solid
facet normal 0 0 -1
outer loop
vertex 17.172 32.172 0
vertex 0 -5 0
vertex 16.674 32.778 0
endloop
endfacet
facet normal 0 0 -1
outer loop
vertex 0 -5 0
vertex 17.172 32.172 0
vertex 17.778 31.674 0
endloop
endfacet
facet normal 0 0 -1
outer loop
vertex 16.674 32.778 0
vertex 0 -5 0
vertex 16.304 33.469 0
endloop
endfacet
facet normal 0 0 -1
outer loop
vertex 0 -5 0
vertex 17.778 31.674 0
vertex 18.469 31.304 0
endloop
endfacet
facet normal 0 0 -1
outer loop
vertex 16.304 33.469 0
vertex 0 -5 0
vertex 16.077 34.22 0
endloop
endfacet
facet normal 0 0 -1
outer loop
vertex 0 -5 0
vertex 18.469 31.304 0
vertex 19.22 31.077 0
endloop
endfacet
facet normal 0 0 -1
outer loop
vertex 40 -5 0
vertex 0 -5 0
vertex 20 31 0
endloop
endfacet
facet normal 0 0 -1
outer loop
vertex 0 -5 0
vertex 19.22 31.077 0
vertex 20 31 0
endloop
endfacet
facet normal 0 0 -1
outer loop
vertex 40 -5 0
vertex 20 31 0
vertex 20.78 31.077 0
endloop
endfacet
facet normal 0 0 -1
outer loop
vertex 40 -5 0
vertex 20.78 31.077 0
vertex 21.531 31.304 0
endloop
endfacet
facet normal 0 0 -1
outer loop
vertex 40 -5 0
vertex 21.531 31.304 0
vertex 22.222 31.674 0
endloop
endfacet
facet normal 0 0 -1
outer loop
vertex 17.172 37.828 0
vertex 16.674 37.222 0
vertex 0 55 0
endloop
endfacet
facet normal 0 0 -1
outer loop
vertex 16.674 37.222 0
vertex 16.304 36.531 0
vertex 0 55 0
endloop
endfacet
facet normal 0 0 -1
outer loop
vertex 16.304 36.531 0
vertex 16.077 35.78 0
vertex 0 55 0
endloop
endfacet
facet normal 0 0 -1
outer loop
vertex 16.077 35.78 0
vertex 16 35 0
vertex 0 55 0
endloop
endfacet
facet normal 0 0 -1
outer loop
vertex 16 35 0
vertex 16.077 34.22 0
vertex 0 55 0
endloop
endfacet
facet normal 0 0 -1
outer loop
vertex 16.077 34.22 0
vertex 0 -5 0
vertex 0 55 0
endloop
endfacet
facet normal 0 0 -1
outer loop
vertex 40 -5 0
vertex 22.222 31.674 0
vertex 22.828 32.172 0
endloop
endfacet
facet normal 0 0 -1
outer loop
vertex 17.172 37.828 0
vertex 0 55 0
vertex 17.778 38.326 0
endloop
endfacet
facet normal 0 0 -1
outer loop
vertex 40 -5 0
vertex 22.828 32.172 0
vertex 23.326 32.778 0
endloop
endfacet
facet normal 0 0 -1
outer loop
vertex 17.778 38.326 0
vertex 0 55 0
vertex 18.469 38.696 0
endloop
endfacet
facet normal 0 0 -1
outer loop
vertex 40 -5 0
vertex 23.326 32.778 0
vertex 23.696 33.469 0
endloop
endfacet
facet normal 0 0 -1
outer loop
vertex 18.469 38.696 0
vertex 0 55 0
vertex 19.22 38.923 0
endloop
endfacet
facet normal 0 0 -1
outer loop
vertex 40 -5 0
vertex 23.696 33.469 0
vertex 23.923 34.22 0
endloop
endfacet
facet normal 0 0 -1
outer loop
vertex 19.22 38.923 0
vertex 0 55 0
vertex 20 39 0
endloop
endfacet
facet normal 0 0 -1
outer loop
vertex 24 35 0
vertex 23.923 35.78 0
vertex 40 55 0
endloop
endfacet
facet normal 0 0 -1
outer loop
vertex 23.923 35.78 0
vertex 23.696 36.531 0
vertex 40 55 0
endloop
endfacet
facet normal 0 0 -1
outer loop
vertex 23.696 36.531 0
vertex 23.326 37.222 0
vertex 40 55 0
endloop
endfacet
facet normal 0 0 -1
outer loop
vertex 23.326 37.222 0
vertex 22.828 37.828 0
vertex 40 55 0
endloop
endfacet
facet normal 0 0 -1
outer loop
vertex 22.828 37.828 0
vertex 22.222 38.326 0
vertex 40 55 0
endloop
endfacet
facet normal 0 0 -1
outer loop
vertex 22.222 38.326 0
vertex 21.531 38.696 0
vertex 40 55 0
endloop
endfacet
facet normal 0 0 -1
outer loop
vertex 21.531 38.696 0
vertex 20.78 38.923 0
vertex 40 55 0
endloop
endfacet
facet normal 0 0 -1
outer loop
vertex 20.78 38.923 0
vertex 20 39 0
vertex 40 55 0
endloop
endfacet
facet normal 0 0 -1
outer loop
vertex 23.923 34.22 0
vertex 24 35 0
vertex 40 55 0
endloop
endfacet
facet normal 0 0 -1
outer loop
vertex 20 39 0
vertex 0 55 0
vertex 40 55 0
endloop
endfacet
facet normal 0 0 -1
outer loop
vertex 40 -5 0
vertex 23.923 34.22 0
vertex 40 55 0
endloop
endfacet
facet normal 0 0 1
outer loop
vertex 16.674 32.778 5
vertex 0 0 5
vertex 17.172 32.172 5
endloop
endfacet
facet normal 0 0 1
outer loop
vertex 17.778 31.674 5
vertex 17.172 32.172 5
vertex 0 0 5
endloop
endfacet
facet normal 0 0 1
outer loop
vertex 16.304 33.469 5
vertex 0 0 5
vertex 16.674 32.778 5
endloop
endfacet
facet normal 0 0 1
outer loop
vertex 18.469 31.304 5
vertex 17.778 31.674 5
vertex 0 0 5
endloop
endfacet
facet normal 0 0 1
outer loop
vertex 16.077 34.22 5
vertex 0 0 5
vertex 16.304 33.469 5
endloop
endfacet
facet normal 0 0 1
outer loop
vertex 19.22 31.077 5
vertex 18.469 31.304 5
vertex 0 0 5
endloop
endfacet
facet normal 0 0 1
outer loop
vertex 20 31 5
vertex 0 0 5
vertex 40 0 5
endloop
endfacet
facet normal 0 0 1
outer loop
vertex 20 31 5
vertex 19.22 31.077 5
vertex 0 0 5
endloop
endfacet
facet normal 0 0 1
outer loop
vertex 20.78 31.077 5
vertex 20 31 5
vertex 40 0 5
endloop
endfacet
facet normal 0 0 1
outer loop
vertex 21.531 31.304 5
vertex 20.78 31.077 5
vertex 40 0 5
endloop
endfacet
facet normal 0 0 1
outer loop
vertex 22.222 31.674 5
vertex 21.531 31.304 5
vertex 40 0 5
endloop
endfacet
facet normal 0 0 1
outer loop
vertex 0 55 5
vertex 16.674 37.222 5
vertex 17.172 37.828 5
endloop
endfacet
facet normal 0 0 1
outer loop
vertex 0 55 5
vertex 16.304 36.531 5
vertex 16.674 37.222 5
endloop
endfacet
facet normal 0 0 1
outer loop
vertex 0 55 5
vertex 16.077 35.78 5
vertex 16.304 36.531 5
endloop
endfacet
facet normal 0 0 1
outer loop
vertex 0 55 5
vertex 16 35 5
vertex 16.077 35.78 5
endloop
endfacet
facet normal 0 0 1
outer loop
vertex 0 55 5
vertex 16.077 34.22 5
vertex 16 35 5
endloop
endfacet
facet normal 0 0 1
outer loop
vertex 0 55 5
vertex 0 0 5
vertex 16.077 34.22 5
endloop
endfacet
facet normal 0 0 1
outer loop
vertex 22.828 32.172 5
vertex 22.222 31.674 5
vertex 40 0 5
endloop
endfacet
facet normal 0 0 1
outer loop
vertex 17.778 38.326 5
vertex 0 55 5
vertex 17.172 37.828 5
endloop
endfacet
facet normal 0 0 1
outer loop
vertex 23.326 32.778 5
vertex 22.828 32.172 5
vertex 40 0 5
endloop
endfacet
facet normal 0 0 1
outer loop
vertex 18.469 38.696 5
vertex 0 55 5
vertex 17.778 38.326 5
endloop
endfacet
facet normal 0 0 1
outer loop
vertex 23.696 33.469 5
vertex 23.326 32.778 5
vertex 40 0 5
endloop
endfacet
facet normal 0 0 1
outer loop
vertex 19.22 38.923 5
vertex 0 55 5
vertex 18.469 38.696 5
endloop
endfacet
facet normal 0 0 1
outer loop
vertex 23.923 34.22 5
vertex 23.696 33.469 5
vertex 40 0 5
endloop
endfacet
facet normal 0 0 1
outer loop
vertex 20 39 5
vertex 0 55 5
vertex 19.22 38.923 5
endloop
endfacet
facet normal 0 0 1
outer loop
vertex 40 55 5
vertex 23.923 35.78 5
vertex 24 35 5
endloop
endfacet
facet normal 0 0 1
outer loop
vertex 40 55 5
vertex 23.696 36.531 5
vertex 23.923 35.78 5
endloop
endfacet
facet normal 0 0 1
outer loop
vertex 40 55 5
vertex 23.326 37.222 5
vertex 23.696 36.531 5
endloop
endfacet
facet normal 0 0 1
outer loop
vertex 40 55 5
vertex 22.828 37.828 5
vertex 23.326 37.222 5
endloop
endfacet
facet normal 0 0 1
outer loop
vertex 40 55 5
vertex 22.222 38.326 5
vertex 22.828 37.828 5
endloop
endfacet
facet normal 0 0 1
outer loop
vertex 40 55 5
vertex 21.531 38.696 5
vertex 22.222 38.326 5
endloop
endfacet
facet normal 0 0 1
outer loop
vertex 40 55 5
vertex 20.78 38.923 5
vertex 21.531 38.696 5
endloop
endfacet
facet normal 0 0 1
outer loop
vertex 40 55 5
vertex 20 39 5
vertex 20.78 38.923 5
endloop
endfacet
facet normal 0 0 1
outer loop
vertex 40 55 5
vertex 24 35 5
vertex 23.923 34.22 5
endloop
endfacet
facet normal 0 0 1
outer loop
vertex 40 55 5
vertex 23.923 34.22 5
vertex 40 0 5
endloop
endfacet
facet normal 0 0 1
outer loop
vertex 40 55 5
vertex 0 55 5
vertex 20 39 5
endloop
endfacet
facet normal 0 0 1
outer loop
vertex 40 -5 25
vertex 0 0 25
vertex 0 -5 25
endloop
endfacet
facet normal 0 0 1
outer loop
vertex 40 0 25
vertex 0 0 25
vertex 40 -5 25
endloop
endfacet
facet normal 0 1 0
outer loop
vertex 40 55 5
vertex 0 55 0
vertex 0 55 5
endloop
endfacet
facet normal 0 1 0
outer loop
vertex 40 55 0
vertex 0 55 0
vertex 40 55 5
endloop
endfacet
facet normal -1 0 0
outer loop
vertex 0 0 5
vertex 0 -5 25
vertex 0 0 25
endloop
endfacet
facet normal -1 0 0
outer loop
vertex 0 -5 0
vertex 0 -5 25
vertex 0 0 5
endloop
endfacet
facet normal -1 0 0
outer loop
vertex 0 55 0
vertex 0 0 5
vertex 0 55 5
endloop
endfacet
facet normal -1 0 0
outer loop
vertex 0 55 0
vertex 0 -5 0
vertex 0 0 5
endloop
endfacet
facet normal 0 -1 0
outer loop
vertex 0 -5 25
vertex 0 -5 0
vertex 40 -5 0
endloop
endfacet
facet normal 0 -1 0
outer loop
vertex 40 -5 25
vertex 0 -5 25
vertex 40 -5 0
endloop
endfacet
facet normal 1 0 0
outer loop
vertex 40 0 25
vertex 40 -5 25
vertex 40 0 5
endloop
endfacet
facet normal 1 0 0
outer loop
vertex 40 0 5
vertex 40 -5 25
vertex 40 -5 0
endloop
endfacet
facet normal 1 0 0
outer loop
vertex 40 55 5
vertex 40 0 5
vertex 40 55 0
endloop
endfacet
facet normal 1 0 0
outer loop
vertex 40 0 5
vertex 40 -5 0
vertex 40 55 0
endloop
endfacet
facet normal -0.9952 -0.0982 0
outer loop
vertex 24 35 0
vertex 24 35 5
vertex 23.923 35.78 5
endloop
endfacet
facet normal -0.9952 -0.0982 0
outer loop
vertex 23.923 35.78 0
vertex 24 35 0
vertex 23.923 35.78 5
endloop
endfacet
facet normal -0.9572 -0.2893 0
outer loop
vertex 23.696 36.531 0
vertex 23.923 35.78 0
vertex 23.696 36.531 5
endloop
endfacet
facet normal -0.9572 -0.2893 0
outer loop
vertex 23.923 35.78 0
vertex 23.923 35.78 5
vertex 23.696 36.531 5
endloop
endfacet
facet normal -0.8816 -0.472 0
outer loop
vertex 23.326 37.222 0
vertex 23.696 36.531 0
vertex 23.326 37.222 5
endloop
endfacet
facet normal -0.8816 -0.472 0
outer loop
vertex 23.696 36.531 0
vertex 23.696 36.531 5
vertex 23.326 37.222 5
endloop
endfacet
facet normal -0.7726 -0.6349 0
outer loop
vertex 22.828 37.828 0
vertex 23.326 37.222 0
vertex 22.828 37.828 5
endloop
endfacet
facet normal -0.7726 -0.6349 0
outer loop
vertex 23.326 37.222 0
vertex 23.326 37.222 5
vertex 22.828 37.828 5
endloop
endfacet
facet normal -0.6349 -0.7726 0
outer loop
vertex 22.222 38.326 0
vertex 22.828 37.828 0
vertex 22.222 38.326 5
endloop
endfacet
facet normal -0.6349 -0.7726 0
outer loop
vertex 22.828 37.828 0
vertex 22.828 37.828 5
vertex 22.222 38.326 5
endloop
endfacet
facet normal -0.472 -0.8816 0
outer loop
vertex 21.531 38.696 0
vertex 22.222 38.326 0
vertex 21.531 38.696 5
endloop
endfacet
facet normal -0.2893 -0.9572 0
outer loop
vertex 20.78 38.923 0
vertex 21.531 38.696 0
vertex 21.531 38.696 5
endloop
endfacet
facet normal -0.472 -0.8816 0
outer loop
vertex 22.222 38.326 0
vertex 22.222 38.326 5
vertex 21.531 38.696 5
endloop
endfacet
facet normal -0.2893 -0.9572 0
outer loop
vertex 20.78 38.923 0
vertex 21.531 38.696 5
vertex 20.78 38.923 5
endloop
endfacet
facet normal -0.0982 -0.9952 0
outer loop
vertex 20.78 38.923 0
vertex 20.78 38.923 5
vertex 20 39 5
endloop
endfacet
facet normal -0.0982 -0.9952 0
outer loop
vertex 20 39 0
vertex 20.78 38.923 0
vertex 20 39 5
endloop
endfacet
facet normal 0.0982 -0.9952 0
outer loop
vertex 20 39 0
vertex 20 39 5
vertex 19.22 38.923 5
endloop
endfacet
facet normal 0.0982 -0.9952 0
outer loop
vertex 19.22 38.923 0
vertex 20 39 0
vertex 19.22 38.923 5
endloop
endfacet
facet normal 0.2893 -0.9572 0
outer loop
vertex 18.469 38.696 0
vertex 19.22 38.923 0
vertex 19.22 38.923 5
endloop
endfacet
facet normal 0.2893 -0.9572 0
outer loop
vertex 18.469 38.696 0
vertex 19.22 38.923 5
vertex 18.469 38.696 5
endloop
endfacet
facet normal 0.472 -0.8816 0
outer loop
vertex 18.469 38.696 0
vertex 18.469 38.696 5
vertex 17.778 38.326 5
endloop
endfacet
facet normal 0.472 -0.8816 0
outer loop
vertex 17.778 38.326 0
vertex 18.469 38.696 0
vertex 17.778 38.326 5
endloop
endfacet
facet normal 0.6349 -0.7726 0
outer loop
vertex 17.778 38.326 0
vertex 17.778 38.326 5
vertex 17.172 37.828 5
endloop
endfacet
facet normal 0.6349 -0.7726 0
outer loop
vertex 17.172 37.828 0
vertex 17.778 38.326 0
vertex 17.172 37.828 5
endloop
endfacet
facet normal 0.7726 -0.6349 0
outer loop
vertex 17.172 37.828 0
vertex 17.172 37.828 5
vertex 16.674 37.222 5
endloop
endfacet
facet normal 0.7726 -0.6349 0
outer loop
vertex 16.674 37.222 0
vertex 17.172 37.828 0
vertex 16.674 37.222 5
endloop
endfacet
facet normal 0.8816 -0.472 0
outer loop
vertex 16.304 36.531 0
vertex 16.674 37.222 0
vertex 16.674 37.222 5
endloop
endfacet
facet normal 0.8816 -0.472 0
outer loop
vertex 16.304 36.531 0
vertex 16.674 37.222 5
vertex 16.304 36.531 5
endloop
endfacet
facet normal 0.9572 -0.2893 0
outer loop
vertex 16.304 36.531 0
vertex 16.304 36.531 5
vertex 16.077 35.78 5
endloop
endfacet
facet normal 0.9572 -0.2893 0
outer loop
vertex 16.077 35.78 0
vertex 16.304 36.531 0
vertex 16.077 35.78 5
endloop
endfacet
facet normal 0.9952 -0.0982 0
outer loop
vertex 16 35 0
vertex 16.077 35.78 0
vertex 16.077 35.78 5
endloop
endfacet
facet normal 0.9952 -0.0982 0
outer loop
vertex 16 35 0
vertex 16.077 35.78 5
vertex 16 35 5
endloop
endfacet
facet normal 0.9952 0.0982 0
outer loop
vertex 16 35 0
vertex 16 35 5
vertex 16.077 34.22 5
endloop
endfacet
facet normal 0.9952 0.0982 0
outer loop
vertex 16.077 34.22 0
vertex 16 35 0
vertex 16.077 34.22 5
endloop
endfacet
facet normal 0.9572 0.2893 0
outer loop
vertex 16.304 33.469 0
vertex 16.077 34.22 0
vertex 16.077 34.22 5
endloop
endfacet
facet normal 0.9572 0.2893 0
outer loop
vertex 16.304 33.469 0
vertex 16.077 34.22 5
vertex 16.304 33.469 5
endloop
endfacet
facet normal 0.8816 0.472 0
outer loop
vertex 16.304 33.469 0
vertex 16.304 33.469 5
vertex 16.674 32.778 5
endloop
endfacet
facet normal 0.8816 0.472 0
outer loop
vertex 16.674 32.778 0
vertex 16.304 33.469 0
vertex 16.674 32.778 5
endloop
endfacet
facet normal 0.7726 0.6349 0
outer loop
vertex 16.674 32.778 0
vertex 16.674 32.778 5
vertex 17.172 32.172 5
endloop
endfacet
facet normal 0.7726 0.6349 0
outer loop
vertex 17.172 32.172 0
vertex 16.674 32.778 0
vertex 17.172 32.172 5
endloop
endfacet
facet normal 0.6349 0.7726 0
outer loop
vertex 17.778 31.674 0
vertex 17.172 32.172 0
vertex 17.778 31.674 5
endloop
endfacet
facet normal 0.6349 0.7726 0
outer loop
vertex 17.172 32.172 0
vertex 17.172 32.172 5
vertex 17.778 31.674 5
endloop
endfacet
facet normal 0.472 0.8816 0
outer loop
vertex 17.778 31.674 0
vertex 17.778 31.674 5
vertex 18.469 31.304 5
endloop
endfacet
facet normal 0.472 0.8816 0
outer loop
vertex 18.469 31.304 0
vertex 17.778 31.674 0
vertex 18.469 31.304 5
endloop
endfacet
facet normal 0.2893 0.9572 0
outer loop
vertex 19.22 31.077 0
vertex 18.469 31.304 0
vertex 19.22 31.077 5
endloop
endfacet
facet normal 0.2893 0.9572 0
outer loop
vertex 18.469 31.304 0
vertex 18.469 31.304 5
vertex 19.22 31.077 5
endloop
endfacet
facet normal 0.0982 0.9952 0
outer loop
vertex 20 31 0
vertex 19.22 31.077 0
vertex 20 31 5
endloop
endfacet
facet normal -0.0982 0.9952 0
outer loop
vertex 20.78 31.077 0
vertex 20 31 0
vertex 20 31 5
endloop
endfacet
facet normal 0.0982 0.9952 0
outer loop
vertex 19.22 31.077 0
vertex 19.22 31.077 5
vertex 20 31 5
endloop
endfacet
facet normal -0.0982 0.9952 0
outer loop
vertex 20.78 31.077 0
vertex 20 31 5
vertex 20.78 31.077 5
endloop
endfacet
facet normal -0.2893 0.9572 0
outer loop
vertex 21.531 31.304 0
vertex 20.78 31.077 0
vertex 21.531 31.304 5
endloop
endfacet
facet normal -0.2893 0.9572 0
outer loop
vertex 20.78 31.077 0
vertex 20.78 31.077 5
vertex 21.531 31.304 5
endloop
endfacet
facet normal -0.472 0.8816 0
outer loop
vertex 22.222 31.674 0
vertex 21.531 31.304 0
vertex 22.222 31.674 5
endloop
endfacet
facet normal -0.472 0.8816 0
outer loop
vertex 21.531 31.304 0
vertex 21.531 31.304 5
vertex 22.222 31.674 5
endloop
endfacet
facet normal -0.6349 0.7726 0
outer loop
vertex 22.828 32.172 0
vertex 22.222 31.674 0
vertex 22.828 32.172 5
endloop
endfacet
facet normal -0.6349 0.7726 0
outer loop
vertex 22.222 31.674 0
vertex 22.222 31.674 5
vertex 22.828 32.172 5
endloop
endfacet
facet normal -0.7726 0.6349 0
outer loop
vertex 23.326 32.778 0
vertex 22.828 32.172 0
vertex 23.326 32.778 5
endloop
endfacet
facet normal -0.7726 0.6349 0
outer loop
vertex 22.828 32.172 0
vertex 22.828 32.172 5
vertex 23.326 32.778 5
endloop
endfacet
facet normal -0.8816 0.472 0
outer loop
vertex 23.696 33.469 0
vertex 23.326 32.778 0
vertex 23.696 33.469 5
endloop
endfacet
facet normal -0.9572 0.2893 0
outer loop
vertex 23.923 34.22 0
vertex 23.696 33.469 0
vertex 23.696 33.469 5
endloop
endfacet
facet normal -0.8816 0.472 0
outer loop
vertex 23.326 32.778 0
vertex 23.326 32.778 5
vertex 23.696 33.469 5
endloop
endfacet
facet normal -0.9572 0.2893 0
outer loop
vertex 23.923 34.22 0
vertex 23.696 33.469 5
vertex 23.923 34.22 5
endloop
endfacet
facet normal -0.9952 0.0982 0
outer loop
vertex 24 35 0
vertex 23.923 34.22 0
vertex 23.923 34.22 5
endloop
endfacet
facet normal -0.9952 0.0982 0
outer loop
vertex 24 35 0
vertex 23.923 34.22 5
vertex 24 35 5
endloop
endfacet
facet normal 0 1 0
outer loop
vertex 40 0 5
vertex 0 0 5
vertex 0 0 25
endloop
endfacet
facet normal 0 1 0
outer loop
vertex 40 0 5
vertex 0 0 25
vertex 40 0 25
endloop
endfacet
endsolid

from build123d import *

# Parameters (mm, degrees)
SKETCH1_W           = 40
SKETCH1_H           = 55
BOSS_EXTRUDE1_DEPTH = 5
SKETCH1_3_W         = 40
SKETCH1_3_H         = 5
BOSS_EXTRUDE2_DEPTH = 25
SKETCH2_R           = 4
CUT_EXTRUDE1_DEPTH  = 6


with BuildPart() as part:
    # Sketch1 → Boss-Extrude1 (new body)
    with BuildSketch(Plane.XY):
        with Locations((20, 27.5)):
            Rectangle(SKETCH1_W, SKETCH1_H)
    extrude(amount=BOSS_EXTRUDE1_DEPTH)

    # Sketch1<3> → Boss-Extrude2 (add)
    with BuildSketch(Plane.XY):
        with Locations((20, -2.5)):
            Rectangle(SKETCH1_3_W, SKETCH1_3_H)
    extrude(amount=BOSS_EXTRUDE2_DEPTH)

    # Sketch2 → Cut-Extrude1 (cut, through all)
    with BuildSketch(Plane.XY.offset(5)):
        with Locations((20, 35)):
            Circle(SKETCH2_R)
    extrude(amount=-CUT_EXTRUDE1_DEPTH, mode=Mode.SUBTRACT)


solid = part.part
